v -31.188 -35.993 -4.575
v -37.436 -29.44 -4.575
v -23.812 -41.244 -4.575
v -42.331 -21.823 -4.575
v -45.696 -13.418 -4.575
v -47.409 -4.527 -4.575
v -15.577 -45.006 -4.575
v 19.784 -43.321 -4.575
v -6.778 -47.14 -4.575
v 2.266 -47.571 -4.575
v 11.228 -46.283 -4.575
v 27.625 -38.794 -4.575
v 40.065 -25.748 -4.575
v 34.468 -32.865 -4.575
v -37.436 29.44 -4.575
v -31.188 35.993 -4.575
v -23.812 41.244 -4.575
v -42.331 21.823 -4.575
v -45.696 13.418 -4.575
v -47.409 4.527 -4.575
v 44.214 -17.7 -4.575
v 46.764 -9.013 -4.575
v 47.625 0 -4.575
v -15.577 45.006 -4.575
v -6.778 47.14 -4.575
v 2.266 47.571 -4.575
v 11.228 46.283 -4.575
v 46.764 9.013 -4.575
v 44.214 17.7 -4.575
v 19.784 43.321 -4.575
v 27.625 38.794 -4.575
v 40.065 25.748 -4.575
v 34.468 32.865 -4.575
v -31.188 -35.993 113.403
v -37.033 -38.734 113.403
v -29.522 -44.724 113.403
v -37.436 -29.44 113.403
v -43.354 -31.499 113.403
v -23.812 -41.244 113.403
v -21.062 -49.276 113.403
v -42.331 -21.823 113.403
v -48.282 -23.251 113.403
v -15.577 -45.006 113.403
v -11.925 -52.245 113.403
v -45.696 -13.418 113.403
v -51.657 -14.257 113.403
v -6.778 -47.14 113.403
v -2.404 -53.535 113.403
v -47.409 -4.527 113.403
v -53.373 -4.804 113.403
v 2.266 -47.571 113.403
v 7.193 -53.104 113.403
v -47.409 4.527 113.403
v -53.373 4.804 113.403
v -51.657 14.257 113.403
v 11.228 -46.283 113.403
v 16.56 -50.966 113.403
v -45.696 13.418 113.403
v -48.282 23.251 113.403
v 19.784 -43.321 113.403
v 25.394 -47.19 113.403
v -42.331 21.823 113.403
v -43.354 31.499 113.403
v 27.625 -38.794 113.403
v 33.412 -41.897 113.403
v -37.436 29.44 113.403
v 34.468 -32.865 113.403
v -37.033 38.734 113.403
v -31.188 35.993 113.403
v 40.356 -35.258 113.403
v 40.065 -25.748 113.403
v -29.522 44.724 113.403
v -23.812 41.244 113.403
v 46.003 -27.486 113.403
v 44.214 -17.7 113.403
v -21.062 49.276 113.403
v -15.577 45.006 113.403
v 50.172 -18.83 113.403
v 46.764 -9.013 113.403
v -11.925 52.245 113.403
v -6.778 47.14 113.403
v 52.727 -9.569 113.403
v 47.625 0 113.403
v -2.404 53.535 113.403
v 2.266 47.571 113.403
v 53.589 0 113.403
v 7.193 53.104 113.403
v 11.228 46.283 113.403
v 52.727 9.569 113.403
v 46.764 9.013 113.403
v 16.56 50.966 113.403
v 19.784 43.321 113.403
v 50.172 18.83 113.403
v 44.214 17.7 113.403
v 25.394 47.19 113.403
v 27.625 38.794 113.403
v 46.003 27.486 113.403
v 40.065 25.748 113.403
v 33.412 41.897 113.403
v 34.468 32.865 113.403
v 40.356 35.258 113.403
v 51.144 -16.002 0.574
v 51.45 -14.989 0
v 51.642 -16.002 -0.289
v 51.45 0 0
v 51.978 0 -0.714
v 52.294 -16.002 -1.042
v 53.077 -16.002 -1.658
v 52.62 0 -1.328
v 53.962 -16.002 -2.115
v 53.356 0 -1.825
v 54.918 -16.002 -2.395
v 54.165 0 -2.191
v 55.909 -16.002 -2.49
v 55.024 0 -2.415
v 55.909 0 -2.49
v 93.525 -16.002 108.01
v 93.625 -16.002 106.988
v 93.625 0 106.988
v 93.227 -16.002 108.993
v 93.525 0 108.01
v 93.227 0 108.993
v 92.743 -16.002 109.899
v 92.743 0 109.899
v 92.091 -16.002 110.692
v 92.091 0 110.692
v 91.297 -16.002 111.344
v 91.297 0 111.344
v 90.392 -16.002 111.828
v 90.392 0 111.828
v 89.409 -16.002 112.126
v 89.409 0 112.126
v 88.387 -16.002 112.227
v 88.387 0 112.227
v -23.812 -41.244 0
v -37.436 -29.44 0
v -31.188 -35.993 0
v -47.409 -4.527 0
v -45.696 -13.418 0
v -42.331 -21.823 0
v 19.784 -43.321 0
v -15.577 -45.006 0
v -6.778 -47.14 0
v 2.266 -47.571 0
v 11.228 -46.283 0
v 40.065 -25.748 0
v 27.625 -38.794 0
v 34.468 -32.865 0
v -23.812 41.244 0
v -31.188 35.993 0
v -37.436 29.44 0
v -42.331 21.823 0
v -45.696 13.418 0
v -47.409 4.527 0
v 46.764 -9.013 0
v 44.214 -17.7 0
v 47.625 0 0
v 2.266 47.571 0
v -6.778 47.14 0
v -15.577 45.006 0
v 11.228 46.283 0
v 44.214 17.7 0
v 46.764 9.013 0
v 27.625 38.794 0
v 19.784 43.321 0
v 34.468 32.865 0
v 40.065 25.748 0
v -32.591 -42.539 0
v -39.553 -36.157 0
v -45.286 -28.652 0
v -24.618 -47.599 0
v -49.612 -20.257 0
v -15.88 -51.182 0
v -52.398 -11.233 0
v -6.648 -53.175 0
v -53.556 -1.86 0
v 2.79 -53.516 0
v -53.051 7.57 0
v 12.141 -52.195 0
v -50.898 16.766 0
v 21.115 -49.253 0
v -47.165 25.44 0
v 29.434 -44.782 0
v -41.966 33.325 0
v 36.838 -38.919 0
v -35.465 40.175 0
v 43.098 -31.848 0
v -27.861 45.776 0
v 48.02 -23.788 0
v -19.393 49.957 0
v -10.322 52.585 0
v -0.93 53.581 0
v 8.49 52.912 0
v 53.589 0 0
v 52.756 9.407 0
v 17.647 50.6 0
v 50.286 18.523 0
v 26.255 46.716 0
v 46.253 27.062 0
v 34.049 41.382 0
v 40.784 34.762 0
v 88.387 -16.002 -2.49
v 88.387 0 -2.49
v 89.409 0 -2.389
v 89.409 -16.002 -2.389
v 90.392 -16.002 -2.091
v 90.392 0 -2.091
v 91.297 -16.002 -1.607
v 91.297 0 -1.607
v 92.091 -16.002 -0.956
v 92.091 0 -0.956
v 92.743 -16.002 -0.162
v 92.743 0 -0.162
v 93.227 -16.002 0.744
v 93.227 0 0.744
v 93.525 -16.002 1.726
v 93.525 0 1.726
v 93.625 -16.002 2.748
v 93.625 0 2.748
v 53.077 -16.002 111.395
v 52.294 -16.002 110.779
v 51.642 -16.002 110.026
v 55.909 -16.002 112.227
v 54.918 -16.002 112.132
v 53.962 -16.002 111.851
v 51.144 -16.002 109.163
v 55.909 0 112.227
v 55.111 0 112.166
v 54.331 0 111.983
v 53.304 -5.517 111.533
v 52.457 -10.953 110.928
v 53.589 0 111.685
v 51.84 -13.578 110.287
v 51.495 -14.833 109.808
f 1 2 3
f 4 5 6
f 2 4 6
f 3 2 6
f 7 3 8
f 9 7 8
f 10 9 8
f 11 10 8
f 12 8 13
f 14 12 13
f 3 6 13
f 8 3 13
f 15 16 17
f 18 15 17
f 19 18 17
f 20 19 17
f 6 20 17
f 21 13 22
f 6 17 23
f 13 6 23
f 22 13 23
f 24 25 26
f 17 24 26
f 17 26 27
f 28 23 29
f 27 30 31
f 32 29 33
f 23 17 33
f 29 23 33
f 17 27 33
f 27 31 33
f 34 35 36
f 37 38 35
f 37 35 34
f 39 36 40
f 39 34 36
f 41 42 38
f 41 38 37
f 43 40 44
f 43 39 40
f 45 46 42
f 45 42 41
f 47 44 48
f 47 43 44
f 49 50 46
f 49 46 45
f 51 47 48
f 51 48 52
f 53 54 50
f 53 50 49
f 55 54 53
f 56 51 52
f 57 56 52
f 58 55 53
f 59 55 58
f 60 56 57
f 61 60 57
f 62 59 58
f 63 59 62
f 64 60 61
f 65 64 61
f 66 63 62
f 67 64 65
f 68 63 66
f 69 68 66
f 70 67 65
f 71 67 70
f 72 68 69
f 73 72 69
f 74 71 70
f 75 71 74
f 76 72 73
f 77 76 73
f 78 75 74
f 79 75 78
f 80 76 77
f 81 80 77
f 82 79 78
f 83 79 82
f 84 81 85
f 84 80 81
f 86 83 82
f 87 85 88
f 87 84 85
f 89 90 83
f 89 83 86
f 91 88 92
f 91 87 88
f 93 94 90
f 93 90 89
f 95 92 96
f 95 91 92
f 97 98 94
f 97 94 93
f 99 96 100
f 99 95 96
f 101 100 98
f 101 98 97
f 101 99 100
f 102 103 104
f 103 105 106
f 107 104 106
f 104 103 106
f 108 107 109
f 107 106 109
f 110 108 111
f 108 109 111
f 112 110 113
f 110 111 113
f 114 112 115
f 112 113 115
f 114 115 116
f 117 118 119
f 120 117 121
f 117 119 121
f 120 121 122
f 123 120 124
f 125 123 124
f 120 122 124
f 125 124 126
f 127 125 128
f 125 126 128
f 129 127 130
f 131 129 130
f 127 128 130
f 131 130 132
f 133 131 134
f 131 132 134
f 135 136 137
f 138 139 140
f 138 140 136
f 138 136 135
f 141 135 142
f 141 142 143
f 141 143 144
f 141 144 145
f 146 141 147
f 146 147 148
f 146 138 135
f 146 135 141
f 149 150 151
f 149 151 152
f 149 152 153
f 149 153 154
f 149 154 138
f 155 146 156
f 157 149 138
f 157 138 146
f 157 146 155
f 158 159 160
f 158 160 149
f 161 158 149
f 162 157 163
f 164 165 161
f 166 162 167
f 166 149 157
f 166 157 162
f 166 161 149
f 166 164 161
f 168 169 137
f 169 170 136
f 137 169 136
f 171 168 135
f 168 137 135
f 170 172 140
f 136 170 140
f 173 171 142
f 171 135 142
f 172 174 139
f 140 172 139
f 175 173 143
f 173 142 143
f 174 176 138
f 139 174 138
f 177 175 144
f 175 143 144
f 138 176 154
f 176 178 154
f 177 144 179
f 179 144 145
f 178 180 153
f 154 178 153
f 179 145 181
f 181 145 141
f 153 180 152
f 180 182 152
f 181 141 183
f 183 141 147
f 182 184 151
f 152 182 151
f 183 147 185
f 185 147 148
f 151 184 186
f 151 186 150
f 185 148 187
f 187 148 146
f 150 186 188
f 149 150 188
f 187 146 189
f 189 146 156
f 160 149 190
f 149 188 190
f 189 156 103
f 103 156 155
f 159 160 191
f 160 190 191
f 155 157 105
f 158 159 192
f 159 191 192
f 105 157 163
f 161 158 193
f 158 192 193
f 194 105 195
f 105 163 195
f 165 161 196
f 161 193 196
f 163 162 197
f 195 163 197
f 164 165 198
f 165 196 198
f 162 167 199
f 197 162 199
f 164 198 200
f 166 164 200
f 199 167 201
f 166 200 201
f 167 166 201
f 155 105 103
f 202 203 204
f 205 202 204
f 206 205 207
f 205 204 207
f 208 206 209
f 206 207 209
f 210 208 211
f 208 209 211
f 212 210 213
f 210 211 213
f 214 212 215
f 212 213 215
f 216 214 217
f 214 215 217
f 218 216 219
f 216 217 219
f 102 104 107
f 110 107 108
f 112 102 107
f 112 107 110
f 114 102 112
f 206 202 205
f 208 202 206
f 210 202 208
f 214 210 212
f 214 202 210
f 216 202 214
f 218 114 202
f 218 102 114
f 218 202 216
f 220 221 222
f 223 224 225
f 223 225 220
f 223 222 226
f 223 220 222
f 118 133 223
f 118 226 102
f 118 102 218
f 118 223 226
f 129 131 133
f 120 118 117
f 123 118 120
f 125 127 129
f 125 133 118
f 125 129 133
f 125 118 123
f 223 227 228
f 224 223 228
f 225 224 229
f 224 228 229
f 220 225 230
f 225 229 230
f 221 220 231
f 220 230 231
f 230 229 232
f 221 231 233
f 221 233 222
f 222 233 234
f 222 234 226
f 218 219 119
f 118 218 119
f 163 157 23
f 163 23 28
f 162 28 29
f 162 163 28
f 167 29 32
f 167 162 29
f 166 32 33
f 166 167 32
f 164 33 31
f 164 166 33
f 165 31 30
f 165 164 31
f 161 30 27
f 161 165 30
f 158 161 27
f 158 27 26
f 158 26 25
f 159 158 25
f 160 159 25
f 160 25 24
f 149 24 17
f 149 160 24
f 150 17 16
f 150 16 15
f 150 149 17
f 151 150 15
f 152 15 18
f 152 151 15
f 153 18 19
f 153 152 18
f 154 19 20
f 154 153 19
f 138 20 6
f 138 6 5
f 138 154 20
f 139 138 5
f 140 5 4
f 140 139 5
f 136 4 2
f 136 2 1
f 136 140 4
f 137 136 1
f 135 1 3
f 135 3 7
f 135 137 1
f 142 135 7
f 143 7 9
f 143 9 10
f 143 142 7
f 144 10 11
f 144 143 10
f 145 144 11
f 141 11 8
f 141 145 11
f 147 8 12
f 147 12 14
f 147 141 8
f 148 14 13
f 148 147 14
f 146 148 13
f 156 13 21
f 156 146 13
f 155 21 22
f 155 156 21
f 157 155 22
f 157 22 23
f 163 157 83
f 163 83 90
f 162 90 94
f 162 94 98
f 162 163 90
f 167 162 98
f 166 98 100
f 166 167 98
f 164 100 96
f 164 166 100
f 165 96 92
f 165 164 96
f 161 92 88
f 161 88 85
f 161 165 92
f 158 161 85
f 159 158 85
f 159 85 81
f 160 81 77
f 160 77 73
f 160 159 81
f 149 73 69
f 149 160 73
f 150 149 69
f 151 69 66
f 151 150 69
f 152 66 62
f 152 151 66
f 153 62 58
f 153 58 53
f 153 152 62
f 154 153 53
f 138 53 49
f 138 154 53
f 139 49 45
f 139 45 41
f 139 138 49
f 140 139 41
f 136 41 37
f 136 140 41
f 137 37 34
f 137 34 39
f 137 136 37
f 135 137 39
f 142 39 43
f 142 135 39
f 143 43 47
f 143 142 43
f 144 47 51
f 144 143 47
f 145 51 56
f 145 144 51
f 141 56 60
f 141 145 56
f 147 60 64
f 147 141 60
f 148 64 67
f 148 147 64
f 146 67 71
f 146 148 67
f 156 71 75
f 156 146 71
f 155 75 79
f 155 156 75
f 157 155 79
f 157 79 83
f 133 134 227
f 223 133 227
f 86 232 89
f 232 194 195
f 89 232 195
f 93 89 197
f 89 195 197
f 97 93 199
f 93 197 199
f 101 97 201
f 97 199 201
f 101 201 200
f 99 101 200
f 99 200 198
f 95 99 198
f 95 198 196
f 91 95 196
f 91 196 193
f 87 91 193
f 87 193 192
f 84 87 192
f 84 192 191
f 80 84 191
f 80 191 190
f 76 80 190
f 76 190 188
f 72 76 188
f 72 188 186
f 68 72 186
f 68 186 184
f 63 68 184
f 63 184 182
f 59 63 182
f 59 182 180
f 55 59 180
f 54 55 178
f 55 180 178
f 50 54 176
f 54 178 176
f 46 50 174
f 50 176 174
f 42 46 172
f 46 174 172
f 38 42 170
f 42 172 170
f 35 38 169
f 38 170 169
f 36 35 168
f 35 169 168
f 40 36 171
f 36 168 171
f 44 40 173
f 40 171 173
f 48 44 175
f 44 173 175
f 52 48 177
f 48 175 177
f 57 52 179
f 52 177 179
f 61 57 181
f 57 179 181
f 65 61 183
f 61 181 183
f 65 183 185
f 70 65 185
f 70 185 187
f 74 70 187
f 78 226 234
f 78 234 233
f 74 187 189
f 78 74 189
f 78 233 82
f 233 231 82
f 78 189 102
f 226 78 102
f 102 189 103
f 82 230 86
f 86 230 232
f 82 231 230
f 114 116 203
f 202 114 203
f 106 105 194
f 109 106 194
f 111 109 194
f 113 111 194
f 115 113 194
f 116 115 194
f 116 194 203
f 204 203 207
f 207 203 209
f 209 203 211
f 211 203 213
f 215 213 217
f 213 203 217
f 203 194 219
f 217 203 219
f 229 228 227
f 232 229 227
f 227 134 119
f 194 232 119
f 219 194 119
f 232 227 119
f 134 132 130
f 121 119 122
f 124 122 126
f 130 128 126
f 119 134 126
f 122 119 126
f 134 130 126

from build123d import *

# Parameters (mm, degrees)
F0_R     = 53.58861
F0_R_2   = 47.625
F1_DEPTH = 113.40259
F2_DEPTH = 4.574994
F4_DEPTH = 16.002


with BuildPart() as f1:
    # F0 (on Top) → F1 (new body)
    with BuildSketch(Plane.XY):
        Circle(F0_R)
        Circle(F0_R_2, mode=Mode.SUBTRACT)
    extrude(amount=F1_DEPTH)

    # F3 (on Front) → F4 (join)
    with BuildSketch(Plane.XZ):
        with BuildLine():
            Line((88.386922, 112.226754), (55.909471, 112.226754))
            ThreePointArc((55.909471, 112.226754), (52.205263, 110.692421), (50.670929, 106.988213))
            Line((50.670929, 106.988213), (50.670929, 2.748385))
            ThreePointArc((50.670929, 2.748385), (52.205263, -0.955823), (55.909471, -2.490156))
            Line((55.909471, -2.490156), (88.386922, -2.490156))
            ThreePointArc((88.386922, -2.490156), (92.09113, -0.955823), (93.625464, 2.748385))
            Line((93.625464, 2.748385), (93.625464, 106.988213))
            ThreePointArc((93.625464, 106.988213), (92.09113, 110.692421), (88.386922, 112.226754))
        make_face()
    extrude(amount=F4_DEPTH)


with BuildPart() as f2:
    # F0 (on Top) → F2 (new body)
    with BuildSketch(Plane.XY):
        Circle(F0_R_2)
    extrude(amount=-F2_DEPTH)


solid = Compound([f1.part, f2.part])
